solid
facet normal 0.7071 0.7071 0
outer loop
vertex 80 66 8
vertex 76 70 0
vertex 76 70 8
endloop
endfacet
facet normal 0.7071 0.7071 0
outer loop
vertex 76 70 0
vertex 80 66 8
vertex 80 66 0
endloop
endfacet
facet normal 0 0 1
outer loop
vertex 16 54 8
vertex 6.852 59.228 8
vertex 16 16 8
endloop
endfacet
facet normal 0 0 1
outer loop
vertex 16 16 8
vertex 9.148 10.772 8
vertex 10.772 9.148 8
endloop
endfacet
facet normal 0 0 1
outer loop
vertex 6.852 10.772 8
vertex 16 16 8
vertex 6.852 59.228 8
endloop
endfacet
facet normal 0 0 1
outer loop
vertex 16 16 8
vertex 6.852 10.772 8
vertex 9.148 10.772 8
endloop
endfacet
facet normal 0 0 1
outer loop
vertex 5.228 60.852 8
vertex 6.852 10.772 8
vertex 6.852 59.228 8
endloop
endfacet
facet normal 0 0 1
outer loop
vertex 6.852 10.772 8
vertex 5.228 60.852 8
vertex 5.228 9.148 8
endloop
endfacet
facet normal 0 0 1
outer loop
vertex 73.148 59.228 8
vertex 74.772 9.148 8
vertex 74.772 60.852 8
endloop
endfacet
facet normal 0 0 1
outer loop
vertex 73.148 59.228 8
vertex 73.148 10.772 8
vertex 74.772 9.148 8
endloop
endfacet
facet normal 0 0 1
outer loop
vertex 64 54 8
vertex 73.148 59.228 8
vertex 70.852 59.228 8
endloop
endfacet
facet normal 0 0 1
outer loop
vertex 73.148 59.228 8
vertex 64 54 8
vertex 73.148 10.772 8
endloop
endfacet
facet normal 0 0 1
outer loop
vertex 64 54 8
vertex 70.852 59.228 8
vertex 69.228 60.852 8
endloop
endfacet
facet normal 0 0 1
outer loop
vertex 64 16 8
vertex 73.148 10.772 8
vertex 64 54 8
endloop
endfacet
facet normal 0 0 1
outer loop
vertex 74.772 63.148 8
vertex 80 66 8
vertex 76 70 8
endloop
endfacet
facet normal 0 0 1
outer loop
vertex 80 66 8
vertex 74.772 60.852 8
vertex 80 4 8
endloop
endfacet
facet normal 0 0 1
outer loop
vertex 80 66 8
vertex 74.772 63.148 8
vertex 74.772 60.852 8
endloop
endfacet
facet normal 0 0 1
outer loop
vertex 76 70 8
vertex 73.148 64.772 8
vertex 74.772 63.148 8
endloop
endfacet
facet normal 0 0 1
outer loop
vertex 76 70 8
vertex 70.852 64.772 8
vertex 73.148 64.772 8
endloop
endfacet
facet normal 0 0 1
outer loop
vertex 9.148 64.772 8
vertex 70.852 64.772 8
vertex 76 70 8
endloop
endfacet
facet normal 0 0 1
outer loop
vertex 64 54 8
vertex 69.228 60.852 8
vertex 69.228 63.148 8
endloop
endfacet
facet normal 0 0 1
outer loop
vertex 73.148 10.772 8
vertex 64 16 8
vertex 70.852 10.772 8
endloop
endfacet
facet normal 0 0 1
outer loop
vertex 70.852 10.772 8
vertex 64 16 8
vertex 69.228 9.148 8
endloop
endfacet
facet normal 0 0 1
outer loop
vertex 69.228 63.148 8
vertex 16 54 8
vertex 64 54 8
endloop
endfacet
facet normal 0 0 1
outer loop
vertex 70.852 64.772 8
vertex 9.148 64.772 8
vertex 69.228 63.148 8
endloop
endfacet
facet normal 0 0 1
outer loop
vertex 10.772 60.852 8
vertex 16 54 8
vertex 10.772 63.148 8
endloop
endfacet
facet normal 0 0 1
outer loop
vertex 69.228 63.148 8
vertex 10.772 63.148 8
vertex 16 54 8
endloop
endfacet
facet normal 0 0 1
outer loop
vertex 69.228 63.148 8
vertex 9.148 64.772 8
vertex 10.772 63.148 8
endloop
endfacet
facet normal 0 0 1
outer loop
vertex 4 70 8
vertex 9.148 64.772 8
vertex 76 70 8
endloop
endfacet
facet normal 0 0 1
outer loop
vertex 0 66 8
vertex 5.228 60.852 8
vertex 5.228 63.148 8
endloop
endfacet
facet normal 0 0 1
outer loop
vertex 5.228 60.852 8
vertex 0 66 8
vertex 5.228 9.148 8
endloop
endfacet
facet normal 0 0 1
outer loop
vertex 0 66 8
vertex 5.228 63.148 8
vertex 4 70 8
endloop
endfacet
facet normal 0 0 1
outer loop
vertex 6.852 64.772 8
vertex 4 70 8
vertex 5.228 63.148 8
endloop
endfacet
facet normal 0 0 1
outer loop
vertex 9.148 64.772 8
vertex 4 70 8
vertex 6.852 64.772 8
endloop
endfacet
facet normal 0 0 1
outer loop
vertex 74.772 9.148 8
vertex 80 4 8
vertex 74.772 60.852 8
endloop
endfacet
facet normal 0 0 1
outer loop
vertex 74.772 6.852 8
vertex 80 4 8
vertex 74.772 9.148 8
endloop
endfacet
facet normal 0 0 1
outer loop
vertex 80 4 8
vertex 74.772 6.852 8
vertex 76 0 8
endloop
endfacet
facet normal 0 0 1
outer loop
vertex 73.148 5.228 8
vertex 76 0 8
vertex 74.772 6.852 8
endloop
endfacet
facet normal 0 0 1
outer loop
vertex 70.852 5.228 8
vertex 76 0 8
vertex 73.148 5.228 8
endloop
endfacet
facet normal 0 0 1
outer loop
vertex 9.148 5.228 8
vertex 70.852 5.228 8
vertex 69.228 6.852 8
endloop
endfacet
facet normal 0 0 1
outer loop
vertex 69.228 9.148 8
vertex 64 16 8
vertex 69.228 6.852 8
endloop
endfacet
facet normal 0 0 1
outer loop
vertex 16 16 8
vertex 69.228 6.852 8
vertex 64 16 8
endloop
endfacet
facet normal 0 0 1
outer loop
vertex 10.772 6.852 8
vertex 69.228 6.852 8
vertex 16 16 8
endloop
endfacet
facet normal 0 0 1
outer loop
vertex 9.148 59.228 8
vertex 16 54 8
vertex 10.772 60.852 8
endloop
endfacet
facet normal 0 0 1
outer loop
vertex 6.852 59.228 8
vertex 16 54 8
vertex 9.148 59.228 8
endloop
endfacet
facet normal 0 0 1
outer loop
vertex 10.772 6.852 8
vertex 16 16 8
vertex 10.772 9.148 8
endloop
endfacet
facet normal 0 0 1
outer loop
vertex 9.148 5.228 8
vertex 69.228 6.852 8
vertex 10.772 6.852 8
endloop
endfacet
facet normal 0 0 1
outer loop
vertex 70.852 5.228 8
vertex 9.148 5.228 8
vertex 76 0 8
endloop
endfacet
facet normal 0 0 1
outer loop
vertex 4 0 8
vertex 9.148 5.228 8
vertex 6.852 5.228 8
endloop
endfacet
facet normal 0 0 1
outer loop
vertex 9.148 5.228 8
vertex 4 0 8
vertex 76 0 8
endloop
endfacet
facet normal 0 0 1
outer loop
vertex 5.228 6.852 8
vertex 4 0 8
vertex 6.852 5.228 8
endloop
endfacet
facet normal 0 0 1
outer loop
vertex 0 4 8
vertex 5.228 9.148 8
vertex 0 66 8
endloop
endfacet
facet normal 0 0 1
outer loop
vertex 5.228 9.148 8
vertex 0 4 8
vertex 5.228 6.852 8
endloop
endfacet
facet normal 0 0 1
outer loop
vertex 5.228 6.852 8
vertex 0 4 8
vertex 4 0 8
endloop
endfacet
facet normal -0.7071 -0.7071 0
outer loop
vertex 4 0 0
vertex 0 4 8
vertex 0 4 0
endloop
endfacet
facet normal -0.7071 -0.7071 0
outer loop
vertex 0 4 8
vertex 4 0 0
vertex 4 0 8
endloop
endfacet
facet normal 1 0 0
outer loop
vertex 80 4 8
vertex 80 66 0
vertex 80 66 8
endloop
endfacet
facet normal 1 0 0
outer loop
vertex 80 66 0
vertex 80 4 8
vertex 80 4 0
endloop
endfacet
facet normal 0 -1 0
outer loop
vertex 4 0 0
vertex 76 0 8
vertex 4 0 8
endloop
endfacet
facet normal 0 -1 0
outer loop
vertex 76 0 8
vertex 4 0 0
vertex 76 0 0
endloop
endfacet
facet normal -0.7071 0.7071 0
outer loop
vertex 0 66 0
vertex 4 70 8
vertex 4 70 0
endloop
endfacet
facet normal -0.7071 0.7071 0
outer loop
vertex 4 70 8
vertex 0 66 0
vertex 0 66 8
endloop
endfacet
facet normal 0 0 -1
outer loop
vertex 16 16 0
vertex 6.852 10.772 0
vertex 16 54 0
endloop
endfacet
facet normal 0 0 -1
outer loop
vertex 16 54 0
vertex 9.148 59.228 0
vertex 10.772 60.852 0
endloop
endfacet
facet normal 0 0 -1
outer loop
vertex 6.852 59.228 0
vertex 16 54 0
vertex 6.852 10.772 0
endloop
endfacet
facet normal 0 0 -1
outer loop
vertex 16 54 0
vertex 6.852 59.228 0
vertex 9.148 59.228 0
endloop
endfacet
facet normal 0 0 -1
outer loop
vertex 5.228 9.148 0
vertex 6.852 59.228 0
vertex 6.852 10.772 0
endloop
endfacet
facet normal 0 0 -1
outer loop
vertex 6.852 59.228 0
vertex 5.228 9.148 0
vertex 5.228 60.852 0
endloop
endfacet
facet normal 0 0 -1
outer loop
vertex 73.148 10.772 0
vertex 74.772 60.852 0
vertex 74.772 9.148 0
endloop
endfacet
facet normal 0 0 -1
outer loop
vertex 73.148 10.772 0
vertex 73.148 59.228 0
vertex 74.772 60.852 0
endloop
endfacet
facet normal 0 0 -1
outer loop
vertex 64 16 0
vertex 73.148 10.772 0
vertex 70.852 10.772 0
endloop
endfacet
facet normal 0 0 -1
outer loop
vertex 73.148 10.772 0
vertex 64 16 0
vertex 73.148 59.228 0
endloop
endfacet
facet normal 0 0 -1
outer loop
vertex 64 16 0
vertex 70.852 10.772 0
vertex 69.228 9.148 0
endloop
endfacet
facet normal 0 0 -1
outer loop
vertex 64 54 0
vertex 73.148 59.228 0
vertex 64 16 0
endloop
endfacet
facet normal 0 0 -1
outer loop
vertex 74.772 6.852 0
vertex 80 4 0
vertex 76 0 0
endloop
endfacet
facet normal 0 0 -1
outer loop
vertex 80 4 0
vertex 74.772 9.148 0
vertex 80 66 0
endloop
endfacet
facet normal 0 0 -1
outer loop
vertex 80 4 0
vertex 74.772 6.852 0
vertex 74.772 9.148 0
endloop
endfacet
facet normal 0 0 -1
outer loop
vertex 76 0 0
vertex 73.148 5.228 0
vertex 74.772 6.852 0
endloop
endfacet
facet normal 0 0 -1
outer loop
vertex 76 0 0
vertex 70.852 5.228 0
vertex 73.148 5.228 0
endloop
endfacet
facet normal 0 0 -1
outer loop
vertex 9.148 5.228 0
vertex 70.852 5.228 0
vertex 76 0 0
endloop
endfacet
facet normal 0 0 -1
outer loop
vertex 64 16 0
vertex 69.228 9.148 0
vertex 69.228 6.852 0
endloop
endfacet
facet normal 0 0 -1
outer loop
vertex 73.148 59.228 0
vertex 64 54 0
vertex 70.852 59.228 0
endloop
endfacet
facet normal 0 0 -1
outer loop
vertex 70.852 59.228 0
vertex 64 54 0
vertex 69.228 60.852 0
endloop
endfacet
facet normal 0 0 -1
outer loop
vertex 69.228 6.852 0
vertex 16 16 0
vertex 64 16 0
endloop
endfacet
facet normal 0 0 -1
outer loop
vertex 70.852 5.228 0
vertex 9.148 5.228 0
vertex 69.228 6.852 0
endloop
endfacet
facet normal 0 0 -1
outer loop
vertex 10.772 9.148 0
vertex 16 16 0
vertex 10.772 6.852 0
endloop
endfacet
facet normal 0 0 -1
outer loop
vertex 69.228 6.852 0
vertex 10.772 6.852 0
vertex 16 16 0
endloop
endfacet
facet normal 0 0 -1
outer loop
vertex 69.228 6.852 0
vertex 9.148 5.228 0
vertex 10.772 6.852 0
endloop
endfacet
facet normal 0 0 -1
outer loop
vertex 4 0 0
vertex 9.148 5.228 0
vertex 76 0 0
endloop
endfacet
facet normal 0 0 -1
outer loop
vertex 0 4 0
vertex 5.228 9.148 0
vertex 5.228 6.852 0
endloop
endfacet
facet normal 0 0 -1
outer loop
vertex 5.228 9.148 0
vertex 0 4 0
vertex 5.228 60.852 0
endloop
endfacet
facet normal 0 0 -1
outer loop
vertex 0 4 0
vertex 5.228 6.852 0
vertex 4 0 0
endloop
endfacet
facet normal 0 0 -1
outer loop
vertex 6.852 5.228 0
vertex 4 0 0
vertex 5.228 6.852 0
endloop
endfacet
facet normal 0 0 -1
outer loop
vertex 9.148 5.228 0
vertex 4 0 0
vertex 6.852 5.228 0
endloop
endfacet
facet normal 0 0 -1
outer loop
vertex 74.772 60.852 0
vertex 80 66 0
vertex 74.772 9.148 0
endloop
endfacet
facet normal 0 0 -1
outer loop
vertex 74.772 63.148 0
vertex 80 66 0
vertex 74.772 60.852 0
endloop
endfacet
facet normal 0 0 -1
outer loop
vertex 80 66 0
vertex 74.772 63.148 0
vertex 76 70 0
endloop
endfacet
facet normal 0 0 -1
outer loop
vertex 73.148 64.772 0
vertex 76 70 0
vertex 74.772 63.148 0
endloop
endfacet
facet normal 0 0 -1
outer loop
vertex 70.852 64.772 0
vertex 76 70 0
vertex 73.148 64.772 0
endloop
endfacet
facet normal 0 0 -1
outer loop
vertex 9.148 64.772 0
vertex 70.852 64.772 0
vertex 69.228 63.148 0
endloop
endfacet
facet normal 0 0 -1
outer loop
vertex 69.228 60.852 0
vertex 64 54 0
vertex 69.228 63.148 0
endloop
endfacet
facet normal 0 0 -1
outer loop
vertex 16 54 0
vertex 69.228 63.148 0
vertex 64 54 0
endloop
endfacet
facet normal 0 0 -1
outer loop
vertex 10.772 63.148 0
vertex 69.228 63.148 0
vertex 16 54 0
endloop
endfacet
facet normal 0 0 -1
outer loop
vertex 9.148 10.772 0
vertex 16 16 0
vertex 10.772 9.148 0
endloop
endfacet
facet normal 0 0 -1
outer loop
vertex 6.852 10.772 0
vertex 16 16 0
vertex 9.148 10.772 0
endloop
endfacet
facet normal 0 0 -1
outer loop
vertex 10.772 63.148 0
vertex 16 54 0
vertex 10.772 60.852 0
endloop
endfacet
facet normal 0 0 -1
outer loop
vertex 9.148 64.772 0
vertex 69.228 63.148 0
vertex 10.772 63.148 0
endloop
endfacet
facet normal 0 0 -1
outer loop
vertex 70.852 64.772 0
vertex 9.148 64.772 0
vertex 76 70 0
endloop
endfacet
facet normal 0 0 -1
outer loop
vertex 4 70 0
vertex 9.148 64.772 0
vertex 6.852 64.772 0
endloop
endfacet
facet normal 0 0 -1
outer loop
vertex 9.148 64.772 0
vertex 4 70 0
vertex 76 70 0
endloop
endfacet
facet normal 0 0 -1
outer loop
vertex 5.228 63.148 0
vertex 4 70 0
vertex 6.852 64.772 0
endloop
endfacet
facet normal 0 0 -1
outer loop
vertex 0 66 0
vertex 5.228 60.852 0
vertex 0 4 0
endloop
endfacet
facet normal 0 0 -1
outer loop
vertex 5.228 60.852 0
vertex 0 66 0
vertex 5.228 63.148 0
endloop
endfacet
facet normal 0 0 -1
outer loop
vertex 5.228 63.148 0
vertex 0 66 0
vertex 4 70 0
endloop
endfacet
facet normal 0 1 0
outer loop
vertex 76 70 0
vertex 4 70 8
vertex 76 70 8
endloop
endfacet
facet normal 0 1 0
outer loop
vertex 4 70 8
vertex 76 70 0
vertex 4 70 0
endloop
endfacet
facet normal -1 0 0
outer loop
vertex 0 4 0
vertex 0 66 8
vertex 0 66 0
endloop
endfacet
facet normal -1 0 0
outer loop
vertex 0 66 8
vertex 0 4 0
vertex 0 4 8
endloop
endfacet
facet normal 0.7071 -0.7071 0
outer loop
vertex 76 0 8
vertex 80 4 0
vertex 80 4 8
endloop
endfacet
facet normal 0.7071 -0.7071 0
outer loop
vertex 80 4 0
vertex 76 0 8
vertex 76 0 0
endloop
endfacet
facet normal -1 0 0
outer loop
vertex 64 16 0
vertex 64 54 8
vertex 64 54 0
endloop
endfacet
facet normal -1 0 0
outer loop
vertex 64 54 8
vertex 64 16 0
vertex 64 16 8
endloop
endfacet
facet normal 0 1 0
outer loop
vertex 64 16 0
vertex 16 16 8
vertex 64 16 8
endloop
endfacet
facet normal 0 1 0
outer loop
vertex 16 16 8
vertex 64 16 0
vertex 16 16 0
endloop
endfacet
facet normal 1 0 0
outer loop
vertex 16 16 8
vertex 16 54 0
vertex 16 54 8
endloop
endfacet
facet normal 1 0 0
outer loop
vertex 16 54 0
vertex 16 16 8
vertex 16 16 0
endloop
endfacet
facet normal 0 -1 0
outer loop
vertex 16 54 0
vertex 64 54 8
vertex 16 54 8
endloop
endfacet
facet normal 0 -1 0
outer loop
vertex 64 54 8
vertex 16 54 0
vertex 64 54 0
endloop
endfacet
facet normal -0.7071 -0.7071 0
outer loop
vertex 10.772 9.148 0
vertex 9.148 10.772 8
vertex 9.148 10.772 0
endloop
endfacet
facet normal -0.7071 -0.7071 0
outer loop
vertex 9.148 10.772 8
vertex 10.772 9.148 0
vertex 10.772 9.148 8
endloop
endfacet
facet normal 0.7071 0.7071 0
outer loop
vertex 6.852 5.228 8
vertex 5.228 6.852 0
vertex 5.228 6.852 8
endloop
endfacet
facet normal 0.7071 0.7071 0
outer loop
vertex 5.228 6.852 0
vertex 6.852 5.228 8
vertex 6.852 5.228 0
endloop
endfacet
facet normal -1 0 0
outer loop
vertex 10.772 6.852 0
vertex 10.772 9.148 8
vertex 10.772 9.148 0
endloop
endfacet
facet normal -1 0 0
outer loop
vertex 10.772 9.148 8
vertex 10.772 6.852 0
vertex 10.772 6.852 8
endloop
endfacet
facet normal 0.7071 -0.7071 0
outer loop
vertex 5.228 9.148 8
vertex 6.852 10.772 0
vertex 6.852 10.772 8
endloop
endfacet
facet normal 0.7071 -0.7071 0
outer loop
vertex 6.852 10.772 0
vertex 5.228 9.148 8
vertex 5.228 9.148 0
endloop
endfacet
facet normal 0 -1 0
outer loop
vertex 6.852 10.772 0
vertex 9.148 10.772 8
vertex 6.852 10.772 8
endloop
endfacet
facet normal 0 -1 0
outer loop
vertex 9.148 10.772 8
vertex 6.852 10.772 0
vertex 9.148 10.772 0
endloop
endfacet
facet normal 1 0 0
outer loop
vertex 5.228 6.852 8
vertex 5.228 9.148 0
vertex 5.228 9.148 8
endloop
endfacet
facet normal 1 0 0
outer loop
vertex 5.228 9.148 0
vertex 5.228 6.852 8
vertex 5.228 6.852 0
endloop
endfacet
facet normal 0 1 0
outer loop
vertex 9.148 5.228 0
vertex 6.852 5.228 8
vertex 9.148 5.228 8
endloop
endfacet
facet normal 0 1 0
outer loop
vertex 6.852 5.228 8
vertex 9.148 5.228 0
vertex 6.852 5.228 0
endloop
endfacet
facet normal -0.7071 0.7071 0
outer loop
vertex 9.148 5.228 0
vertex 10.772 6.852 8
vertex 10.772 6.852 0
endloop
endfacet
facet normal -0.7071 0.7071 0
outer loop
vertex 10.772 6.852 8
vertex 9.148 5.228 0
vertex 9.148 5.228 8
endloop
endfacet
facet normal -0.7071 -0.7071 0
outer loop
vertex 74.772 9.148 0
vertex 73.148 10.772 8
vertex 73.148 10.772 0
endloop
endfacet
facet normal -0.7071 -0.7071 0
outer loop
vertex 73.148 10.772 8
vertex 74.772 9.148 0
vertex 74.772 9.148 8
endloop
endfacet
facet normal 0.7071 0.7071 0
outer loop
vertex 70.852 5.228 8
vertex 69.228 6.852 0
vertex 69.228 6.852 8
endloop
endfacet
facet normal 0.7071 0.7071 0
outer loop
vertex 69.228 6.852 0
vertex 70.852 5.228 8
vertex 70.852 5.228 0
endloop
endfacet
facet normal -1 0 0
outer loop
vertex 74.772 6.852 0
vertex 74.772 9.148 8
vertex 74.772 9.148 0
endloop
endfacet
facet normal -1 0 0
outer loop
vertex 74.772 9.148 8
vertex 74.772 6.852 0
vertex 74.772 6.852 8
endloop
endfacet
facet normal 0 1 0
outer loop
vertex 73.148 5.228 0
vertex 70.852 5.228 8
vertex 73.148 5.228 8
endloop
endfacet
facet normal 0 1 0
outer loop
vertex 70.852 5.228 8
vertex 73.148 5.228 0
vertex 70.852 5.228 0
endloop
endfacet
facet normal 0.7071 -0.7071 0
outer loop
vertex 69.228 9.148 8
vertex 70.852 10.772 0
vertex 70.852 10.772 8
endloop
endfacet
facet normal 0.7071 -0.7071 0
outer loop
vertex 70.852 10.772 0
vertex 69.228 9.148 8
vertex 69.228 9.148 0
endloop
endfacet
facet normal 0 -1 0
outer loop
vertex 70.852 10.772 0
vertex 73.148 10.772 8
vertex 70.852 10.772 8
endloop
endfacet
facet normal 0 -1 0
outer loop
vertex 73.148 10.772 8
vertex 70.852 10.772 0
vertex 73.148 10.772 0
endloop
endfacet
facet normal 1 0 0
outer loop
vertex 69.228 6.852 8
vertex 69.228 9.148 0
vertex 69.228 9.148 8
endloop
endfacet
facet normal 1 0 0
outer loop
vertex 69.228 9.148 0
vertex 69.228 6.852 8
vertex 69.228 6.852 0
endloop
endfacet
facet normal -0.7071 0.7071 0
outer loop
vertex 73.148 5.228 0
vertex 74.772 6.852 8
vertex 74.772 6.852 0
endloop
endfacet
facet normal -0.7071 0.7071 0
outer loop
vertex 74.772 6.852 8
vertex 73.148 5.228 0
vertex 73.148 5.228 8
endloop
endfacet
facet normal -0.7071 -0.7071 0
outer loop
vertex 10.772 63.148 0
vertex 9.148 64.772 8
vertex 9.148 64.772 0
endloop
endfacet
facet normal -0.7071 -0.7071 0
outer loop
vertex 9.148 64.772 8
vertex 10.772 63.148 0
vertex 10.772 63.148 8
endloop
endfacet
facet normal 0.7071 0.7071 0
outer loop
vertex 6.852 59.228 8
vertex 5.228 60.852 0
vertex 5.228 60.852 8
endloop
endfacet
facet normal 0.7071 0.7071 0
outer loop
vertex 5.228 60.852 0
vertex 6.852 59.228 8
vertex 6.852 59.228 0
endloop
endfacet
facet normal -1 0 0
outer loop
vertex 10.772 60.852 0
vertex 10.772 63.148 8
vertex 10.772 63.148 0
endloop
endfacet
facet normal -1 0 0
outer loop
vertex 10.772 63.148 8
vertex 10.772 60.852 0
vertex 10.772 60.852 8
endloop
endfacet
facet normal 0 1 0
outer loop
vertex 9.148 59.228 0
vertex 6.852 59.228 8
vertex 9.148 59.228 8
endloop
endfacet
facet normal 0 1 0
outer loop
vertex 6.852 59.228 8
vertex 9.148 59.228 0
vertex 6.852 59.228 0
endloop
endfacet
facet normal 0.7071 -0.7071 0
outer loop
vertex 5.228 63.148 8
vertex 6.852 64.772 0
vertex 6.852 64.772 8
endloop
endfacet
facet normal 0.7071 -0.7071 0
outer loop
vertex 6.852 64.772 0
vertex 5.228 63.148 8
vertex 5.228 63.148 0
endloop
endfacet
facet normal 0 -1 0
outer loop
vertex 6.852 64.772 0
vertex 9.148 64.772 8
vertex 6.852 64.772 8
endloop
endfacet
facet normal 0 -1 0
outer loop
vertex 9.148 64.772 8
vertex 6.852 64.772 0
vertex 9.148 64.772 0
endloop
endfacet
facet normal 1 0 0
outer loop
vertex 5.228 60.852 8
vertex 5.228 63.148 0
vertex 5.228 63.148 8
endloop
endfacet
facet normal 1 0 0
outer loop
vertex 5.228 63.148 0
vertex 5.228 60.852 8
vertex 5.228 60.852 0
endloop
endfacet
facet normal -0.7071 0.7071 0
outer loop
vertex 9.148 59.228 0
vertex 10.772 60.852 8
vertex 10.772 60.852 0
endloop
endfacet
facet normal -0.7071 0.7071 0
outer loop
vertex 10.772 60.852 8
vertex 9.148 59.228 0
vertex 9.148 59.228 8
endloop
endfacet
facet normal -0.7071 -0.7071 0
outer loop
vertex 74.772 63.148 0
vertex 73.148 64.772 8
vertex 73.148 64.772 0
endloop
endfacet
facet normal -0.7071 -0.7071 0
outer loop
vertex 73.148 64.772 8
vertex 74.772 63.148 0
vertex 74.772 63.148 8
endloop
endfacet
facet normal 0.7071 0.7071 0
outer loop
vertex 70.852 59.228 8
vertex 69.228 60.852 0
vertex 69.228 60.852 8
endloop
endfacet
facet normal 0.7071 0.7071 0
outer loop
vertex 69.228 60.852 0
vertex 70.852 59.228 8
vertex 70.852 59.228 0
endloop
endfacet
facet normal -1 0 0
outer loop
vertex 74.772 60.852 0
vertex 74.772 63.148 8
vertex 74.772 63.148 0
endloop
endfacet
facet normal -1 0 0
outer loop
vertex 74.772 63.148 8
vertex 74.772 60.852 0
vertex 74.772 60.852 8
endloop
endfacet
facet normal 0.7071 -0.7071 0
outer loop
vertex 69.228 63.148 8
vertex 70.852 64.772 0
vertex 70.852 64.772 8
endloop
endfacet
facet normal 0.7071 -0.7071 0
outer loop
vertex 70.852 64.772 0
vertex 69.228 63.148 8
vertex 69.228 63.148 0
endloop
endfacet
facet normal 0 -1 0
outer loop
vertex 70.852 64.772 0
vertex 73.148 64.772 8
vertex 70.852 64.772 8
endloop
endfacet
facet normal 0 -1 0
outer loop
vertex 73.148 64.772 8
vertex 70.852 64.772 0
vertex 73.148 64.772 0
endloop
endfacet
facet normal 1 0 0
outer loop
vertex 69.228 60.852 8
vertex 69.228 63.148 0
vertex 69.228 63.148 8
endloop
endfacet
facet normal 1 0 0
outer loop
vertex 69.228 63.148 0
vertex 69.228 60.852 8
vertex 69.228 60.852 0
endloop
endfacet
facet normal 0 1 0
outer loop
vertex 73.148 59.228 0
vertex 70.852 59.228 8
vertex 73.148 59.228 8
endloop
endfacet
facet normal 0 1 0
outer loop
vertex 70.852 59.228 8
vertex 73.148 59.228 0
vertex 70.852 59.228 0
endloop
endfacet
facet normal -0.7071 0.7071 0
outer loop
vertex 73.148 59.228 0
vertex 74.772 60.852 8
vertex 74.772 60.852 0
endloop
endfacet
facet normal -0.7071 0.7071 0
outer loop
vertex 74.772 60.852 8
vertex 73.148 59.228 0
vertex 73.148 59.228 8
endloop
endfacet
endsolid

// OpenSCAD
$fn = 32;

// ----------------------------------------------------------------------
// Frame plate: 80 x 70 frame, 16 mm rails
// ----------------------------------------------------------------------

// --- parameters (mm) ---
plate_l = 80;             // plate length, X
plate_w = 70;             // plate width, Y
plate_t = 8;              // plate thickness, Z (extrusion height)
corner_c = 4;             // corner chamfer
frame_bar = 16;           // frame rail width
bolt_r = 3;               // corner bolt window radius
bolt_inset = 8;           // bolt centre inset from the edges

win_l = plate_l - 2 * frame_bar;  // window length
win_w = plate_w - 2 * frame_bar;  // window width
bolt_d = 2 * bolt_r;  // corner hole diameter

profile = [[4, 0], [76, 0], [80, 4], [80, 66], [76, 70], [4, 70], [0, 66], [0, 4]];  // primary outline, 8 points, counter clockwise
void_1 = [[16, 16], [64, 16], [64, 54], [16, 54]];  // the window, 4 points
void_2 = [[10.772, 9.148], [9.148, 10.772], [6.852, 10.772], [5.228, 9.148], [5.228, 6.852], [6.852, 5.228], [9.148, 5.228], [10.772, 6.852]];  // corner bolt window, 8 points
void_3 = [[74.772, 9.148], [73.148, 10.772], [70.852, 10.772], [69.228, 9.148], [69.228, 6.852], [70.852, 5.228], [73.148, 5.228], [74.772, 6.852]];  // corner bolt window, 8 points
void_4 = [[10.772, 63.148], [9.148, 64.772], [6.852, 64.772], [5.228, 63.148], [5.228, 60.852], [6.852, 59.228], [9.148, 59.228], [10.772, 60.852]];  // corner bolt window, 8 points
void_5 = [[74.772, 63.148], [73.148, 64.772], [70.852, 64.772], [69.228, 63.148], [69.228, 60.852], [70.852, 59.228], [73.148, 59.228], [74.772, 60.852]];  // corner bolt window, 8 points

// --- the one profile operation ---
difference() {
  linear_extrude(height = plate_t) polygon(points = profile);
  translate([0, 0, -1])
    linear_extrude(height = plate_t + 2) polygon(points = void_1);
  translate([0, 0, -1])
    linear_extrude(height = plate_t + 2) polygon(points = void_2);
  translate([0, 0, -1])
    linear_extrude(height = plate_t + 2) polygon(points = void_3);
  translate([0, 0, -1])
    linear_extrude(height = plate_t + 2) polygon(points = void_4);
  translate([0, 0, -1])
    linear_extrude(height = plate_t + 2) polygon(points = void_5);
}
